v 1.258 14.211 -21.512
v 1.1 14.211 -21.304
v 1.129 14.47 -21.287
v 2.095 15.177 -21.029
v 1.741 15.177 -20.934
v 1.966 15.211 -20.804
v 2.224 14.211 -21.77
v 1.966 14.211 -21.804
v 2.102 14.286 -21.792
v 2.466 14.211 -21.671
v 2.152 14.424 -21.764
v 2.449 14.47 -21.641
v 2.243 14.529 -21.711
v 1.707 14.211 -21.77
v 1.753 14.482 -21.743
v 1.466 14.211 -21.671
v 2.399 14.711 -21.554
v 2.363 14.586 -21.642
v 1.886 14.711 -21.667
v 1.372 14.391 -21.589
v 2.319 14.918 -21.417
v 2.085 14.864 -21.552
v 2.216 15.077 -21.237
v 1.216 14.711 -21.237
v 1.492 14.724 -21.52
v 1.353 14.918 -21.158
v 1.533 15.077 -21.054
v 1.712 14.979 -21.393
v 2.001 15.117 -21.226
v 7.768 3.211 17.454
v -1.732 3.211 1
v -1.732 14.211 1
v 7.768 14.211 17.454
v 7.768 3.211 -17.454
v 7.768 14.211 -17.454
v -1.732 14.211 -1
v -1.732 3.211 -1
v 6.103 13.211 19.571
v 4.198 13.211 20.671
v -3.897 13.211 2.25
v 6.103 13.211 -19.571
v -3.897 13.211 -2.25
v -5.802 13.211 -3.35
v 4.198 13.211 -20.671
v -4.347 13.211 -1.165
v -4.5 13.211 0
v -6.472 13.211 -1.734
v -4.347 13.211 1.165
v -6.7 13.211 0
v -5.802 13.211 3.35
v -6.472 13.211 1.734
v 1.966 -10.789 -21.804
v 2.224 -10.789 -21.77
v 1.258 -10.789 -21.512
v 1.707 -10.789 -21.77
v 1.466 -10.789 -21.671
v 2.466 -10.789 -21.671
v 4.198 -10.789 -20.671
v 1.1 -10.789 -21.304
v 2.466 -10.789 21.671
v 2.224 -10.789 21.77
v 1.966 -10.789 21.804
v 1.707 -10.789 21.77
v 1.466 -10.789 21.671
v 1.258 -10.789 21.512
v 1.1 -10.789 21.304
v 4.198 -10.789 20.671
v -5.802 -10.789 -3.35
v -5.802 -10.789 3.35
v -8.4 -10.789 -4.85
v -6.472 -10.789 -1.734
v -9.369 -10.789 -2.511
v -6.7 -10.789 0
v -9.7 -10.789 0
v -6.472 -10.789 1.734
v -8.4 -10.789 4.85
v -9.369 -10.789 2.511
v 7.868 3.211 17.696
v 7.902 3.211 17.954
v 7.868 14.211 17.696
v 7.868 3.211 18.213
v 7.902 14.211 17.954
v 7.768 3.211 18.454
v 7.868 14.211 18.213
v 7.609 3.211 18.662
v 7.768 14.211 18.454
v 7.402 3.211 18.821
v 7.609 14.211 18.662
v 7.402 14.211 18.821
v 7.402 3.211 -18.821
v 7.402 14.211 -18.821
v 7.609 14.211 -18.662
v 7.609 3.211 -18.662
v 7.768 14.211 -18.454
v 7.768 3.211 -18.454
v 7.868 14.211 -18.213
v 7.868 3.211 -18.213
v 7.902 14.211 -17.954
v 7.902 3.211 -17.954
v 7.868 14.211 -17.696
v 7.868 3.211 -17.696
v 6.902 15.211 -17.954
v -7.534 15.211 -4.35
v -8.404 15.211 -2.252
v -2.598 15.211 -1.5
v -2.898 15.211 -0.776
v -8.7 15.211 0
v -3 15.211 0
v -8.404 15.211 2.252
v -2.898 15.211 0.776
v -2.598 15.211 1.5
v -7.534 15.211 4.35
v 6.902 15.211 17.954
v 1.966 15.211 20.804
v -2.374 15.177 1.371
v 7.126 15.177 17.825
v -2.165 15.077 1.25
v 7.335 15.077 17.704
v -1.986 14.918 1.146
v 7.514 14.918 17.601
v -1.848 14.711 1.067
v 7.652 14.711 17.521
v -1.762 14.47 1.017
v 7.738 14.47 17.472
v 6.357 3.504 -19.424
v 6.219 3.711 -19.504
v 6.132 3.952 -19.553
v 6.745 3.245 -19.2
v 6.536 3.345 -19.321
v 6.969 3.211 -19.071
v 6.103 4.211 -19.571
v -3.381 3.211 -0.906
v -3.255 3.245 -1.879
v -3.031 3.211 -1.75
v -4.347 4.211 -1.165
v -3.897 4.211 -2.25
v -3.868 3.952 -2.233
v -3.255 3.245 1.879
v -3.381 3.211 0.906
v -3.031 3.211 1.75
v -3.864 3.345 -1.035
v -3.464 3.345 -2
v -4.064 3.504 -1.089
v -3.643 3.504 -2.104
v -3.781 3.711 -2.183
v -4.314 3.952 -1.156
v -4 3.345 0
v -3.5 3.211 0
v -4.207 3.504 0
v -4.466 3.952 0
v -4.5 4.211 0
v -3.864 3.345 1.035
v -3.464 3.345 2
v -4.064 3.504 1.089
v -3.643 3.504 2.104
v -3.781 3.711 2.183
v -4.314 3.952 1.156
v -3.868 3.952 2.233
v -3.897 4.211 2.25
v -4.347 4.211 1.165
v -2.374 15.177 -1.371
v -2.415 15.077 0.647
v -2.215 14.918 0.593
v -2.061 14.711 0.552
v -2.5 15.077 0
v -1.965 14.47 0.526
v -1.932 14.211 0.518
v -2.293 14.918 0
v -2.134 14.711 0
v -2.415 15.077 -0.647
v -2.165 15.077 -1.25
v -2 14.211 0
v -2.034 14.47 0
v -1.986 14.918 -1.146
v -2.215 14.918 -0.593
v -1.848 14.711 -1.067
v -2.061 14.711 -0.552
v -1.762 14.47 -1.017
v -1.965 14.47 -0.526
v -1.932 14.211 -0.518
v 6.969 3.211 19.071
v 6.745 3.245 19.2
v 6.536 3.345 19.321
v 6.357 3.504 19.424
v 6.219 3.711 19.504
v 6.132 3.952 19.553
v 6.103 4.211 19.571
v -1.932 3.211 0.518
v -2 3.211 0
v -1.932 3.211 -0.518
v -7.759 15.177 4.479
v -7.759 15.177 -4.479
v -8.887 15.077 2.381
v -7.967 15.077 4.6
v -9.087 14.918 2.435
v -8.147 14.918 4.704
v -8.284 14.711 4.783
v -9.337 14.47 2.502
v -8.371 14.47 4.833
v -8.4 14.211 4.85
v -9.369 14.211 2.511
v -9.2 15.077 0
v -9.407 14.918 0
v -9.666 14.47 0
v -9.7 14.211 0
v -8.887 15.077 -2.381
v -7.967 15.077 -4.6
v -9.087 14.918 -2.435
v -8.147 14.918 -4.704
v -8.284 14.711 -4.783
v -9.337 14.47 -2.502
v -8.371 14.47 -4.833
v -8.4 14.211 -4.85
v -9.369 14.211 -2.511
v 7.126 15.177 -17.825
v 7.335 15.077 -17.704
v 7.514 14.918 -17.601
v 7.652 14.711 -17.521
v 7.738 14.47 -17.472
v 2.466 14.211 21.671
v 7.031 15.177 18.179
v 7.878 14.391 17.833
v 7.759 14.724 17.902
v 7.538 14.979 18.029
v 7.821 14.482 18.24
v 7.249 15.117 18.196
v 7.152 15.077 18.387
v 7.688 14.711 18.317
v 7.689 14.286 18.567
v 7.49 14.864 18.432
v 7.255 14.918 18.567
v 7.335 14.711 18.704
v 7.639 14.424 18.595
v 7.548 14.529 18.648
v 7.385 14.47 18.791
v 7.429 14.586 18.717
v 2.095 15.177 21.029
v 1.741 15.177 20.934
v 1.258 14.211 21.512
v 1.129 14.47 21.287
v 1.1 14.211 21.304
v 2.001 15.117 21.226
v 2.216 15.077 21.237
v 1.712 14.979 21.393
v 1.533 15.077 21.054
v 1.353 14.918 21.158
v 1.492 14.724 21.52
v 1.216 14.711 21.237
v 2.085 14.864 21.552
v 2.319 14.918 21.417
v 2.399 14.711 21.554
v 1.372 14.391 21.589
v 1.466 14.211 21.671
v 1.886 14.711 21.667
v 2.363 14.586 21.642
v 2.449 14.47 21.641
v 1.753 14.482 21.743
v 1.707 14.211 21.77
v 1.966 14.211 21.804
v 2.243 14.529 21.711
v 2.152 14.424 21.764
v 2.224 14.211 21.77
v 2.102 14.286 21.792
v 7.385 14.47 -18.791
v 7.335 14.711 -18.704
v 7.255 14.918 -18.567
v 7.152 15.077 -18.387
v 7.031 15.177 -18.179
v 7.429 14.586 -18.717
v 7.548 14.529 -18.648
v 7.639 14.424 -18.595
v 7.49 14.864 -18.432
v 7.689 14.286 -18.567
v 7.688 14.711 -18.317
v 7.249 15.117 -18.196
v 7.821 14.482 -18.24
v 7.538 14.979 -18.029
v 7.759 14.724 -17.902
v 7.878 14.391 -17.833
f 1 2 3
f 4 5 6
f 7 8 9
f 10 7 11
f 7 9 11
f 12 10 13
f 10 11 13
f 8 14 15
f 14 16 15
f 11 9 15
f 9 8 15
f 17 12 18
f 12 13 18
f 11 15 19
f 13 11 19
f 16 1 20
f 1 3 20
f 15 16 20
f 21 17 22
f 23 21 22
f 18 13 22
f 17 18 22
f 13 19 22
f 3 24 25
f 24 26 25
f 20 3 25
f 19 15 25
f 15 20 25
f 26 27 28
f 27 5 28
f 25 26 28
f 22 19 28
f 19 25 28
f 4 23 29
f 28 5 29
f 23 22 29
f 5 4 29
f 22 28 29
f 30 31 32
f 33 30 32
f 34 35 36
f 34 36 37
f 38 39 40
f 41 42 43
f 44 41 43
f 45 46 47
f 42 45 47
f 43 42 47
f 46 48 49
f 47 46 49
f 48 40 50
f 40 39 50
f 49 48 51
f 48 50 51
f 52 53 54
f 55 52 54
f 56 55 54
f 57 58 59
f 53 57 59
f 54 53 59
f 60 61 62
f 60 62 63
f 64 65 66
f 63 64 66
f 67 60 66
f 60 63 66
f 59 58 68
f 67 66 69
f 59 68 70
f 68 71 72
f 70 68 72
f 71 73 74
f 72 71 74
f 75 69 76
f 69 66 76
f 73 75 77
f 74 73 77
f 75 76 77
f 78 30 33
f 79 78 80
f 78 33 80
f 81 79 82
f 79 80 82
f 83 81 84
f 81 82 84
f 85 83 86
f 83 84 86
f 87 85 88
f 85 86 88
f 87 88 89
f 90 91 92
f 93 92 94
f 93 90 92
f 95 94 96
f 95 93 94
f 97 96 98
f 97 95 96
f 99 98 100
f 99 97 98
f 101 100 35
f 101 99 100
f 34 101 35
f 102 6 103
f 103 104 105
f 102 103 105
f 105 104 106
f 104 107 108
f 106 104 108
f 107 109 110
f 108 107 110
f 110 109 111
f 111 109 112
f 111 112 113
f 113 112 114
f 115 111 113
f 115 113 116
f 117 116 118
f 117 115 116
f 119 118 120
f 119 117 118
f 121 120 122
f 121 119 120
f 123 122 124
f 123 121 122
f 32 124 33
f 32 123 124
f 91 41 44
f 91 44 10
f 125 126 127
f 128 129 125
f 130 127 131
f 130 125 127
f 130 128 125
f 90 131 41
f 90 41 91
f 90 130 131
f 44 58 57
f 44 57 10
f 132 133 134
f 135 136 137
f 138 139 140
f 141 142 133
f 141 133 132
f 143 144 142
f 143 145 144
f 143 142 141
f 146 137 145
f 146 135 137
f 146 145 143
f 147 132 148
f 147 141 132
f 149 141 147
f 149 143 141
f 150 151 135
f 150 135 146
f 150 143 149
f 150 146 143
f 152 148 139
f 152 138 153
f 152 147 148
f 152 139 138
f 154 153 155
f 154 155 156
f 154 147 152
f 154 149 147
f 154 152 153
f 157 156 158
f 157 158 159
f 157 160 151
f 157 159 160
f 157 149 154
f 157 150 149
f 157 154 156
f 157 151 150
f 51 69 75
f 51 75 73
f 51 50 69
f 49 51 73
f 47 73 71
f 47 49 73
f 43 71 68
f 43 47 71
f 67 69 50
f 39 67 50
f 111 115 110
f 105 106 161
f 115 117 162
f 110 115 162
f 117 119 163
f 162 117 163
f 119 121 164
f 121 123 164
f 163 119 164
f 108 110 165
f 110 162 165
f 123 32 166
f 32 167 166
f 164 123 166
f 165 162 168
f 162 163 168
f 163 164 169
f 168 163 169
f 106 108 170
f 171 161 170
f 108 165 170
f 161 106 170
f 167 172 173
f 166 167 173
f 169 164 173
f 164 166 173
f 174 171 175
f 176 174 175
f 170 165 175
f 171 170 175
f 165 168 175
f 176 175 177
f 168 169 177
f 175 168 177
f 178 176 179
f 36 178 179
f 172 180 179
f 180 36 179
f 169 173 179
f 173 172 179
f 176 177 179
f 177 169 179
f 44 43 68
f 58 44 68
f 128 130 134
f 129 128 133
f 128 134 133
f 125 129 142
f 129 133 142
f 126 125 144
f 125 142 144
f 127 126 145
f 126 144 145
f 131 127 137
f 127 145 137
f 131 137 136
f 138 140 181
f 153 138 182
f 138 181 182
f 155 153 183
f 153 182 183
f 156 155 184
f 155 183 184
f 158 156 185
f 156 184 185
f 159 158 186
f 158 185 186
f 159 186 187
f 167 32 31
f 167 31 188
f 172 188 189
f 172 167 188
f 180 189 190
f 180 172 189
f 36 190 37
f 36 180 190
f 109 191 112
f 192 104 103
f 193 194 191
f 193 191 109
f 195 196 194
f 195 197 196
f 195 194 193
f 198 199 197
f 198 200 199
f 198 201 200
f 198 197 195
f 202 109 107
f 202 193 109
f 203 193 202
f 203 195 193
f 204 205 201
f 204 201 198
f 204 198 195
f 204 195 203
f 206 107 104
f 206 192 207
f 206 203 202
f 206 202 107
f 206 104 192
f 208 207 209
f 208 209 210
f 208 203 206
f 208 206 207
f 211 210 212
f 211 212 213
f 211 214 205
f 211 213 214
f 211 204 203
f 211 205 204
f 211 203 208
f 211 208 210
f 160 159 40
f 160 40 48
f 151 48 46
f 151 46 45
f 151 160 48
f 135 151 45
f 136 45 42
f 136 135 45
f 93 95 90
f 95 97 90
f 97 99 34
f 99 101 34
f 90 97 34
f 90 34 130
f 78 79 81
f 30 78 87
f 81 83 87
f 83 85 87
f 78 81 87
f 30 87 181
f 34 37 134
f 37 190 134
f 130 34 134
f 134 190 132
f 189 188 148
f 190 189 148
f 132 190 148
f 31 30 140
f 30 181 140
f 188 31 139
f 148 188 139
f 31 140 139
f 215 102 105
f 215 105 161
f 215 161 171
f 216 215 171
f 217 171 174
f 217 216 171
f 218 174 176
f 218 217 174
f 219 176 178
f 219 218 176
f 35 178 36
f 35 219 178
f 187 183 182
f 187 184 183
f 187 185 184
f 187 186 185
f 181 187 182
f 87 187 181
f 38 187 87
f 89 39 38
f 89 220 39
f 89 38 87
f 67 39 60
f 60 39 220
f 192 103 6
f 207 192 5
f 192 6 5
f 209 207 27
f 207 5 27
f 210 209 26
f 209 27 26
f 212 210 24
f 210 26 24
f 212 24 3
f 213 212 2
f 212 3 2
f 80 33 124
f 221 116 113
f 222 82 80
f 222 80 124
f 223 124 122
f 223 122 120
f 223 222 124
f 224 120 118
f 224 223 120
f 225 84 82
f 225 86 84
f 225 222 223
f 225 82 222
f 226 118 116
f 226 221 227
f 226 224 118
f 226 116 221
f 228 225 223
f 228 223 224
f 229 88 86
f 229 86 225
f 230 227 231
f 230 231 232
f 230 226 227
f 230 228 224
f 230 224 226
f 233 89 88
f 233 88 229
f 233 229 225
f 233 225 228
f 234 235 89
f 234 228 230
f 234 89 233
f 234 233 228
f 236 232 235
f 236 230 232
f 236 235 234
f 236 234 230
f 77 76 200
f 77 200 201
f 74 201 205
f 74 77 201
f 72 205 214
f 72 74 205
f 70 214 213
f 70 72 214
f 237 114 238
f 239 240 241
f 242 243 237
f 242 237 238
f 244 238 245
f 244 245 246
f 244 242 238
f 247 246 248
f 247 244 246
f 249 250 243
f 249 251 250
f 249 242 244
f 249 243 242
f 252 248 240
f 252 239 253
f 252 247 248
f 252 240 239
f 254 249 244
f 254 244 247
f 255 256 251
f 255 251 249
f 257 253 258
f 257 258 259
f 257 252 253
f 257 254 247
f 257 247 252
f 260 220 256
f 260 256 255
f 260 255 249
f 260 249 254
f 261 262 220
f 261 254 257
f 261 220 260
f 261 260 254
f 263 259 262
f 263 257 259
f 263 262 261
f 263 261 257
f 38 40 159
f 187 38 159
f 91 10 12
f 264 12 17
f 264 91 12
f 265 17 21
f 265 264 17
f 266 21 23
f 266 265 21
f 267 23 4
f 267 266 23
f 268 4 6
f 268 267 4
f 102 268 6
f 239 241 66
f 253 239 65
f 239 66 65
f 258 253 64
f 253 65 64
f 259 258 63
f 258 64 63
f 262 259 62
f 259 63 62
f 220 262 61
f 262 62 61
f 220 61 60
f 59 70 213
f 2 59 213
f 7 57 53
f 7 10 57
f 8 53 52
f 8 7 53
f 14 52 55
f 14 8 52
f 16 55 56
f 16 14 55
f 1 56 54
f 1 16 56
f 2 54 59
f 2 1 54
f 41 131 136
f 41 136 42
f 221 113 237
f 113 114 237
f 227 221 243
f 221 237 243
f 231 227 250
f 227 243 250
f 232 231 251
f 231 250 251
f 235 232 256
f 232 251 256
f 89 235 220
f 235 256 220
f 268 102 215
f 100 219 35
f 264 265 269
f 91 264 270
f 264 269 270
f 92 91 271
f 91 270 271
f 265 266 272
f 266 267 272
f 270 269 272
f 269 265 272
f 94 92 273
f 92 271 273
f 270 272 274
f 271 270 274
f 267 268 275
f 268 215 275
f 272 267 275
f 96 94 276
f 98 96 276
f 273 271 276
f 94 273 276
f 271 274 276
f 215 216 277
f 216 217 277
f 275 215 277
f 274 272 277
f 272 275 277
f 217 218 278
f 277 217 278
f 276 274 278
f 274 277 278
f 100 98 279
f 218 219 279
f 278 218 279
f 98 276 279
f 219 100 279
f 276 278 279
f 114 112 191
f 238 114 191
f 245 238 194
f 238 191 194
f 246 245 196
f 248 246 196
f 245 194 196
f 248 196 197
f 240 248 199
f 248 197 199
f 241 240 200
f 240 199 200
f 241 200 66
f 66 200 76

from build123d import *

# Parameters (mm, degrees)
F1_ANGLE_BACK = 30
F1_ANGLE      = 60
F3_DEPTH      = 20
F5_DEPTH      = 20
F6_R          = 1
F7_R          = 1
F8_R          = 1
F9_R          = 1


with BuildPart() as f1:
    # F0 (on Top) → F1 (revolve)
    with BuildSketch(Plane.XY, mode=Mode.PRIVATE) as f1_sk:
        Polygon((-6.7, 15.2109679412), (-9.7, 15.2109679412), (-9.7, -10.7890320588), (-6.7, -10.7890320588), (-6.7, 13.2109679412), (-4.5, 13.2109679412), (-4.5, 3.2109679412), (-2, 3.2109679412), (-2, 13.2109679412), (-2, 15.2109679412), align=None)
    revolve(f1_sk.sketch.rotate(Axis((0, 4.1356552392, 0), (0, -1, 0)), -F1_ANGLE_BACK), axis=Axis((0, 4.1356552392, 0), (0, -1, 0)), revolution_arc=F1_ANGLE)

    # F2 (on face) → F3 (join)
    with BuildSketch(Plane(origin=(0, 0, 0), x_dir=(0.8660254038, 0, -0.5), z_dir=(0.5, 0, 0.8660254038))):
        Polygon((-2, 15.2109679412), (-9.7, 15.2109679412), (-9.7, -10.7890320588), (-6.7, -10.7890320588), (-6.7, 13.2109679412), (-4.5, 13.2109679412), (-4.5, 3.2109679412), (-2, 3.2109679412), align=None)
    extrude(amount=F3_DEPTH)

    # F4 (on face) → F5 (join)
    with BuildSketch(Plane(origin=(0, 0, 0), x_dir=(0.8660254038, 0, 0.5), z_dir=(0.5, 0, -0.8660254038))):
        Polygon((-2, -15.2109679412), (-2, -3.2109679412), (-4.5, -3.2109679412), (-4.5, -13.2109679412), (-6.7, -13.2109679412), (-6.7, 10.7890320588), (-9.7, 10.7890320588), (-9.7, -15.2109679412), align=None)
    extrude(amount=F5_DEPTH)

    # F6
    f6_edges = [f1.edges().sort_by_distance(p)[0] for p in [
        (1.102886, 3.210968, 10.910254),
        (-3.400446, 15.210968, -13.510254),
    ]]
    fillet(f6_edges, radius=F6_R)

    # F7
    f7_edges = [f1.edges().sort_by_distance(p)[0] for p in [
        (3.267949, 15.210968, -9.660254),
    ]]
    fillet(f7_edges, radius=F7_R)

    # F8
    f8_edges = [f1.edges().sort_by_distance(p)[0] for p in [
        (4.933751, 15.210968, 20.245508),
    ]]
    fillet(f8_edges, radius=F8_R)

    # F9
    f9_edges = [f1.edges().sort_by_distance(p)[0] for p in [
        (1.599554, 1.710968, -22.170508),
    ]]
    fillet(f9_edges, radius=F9_R)


solid = f1.part
